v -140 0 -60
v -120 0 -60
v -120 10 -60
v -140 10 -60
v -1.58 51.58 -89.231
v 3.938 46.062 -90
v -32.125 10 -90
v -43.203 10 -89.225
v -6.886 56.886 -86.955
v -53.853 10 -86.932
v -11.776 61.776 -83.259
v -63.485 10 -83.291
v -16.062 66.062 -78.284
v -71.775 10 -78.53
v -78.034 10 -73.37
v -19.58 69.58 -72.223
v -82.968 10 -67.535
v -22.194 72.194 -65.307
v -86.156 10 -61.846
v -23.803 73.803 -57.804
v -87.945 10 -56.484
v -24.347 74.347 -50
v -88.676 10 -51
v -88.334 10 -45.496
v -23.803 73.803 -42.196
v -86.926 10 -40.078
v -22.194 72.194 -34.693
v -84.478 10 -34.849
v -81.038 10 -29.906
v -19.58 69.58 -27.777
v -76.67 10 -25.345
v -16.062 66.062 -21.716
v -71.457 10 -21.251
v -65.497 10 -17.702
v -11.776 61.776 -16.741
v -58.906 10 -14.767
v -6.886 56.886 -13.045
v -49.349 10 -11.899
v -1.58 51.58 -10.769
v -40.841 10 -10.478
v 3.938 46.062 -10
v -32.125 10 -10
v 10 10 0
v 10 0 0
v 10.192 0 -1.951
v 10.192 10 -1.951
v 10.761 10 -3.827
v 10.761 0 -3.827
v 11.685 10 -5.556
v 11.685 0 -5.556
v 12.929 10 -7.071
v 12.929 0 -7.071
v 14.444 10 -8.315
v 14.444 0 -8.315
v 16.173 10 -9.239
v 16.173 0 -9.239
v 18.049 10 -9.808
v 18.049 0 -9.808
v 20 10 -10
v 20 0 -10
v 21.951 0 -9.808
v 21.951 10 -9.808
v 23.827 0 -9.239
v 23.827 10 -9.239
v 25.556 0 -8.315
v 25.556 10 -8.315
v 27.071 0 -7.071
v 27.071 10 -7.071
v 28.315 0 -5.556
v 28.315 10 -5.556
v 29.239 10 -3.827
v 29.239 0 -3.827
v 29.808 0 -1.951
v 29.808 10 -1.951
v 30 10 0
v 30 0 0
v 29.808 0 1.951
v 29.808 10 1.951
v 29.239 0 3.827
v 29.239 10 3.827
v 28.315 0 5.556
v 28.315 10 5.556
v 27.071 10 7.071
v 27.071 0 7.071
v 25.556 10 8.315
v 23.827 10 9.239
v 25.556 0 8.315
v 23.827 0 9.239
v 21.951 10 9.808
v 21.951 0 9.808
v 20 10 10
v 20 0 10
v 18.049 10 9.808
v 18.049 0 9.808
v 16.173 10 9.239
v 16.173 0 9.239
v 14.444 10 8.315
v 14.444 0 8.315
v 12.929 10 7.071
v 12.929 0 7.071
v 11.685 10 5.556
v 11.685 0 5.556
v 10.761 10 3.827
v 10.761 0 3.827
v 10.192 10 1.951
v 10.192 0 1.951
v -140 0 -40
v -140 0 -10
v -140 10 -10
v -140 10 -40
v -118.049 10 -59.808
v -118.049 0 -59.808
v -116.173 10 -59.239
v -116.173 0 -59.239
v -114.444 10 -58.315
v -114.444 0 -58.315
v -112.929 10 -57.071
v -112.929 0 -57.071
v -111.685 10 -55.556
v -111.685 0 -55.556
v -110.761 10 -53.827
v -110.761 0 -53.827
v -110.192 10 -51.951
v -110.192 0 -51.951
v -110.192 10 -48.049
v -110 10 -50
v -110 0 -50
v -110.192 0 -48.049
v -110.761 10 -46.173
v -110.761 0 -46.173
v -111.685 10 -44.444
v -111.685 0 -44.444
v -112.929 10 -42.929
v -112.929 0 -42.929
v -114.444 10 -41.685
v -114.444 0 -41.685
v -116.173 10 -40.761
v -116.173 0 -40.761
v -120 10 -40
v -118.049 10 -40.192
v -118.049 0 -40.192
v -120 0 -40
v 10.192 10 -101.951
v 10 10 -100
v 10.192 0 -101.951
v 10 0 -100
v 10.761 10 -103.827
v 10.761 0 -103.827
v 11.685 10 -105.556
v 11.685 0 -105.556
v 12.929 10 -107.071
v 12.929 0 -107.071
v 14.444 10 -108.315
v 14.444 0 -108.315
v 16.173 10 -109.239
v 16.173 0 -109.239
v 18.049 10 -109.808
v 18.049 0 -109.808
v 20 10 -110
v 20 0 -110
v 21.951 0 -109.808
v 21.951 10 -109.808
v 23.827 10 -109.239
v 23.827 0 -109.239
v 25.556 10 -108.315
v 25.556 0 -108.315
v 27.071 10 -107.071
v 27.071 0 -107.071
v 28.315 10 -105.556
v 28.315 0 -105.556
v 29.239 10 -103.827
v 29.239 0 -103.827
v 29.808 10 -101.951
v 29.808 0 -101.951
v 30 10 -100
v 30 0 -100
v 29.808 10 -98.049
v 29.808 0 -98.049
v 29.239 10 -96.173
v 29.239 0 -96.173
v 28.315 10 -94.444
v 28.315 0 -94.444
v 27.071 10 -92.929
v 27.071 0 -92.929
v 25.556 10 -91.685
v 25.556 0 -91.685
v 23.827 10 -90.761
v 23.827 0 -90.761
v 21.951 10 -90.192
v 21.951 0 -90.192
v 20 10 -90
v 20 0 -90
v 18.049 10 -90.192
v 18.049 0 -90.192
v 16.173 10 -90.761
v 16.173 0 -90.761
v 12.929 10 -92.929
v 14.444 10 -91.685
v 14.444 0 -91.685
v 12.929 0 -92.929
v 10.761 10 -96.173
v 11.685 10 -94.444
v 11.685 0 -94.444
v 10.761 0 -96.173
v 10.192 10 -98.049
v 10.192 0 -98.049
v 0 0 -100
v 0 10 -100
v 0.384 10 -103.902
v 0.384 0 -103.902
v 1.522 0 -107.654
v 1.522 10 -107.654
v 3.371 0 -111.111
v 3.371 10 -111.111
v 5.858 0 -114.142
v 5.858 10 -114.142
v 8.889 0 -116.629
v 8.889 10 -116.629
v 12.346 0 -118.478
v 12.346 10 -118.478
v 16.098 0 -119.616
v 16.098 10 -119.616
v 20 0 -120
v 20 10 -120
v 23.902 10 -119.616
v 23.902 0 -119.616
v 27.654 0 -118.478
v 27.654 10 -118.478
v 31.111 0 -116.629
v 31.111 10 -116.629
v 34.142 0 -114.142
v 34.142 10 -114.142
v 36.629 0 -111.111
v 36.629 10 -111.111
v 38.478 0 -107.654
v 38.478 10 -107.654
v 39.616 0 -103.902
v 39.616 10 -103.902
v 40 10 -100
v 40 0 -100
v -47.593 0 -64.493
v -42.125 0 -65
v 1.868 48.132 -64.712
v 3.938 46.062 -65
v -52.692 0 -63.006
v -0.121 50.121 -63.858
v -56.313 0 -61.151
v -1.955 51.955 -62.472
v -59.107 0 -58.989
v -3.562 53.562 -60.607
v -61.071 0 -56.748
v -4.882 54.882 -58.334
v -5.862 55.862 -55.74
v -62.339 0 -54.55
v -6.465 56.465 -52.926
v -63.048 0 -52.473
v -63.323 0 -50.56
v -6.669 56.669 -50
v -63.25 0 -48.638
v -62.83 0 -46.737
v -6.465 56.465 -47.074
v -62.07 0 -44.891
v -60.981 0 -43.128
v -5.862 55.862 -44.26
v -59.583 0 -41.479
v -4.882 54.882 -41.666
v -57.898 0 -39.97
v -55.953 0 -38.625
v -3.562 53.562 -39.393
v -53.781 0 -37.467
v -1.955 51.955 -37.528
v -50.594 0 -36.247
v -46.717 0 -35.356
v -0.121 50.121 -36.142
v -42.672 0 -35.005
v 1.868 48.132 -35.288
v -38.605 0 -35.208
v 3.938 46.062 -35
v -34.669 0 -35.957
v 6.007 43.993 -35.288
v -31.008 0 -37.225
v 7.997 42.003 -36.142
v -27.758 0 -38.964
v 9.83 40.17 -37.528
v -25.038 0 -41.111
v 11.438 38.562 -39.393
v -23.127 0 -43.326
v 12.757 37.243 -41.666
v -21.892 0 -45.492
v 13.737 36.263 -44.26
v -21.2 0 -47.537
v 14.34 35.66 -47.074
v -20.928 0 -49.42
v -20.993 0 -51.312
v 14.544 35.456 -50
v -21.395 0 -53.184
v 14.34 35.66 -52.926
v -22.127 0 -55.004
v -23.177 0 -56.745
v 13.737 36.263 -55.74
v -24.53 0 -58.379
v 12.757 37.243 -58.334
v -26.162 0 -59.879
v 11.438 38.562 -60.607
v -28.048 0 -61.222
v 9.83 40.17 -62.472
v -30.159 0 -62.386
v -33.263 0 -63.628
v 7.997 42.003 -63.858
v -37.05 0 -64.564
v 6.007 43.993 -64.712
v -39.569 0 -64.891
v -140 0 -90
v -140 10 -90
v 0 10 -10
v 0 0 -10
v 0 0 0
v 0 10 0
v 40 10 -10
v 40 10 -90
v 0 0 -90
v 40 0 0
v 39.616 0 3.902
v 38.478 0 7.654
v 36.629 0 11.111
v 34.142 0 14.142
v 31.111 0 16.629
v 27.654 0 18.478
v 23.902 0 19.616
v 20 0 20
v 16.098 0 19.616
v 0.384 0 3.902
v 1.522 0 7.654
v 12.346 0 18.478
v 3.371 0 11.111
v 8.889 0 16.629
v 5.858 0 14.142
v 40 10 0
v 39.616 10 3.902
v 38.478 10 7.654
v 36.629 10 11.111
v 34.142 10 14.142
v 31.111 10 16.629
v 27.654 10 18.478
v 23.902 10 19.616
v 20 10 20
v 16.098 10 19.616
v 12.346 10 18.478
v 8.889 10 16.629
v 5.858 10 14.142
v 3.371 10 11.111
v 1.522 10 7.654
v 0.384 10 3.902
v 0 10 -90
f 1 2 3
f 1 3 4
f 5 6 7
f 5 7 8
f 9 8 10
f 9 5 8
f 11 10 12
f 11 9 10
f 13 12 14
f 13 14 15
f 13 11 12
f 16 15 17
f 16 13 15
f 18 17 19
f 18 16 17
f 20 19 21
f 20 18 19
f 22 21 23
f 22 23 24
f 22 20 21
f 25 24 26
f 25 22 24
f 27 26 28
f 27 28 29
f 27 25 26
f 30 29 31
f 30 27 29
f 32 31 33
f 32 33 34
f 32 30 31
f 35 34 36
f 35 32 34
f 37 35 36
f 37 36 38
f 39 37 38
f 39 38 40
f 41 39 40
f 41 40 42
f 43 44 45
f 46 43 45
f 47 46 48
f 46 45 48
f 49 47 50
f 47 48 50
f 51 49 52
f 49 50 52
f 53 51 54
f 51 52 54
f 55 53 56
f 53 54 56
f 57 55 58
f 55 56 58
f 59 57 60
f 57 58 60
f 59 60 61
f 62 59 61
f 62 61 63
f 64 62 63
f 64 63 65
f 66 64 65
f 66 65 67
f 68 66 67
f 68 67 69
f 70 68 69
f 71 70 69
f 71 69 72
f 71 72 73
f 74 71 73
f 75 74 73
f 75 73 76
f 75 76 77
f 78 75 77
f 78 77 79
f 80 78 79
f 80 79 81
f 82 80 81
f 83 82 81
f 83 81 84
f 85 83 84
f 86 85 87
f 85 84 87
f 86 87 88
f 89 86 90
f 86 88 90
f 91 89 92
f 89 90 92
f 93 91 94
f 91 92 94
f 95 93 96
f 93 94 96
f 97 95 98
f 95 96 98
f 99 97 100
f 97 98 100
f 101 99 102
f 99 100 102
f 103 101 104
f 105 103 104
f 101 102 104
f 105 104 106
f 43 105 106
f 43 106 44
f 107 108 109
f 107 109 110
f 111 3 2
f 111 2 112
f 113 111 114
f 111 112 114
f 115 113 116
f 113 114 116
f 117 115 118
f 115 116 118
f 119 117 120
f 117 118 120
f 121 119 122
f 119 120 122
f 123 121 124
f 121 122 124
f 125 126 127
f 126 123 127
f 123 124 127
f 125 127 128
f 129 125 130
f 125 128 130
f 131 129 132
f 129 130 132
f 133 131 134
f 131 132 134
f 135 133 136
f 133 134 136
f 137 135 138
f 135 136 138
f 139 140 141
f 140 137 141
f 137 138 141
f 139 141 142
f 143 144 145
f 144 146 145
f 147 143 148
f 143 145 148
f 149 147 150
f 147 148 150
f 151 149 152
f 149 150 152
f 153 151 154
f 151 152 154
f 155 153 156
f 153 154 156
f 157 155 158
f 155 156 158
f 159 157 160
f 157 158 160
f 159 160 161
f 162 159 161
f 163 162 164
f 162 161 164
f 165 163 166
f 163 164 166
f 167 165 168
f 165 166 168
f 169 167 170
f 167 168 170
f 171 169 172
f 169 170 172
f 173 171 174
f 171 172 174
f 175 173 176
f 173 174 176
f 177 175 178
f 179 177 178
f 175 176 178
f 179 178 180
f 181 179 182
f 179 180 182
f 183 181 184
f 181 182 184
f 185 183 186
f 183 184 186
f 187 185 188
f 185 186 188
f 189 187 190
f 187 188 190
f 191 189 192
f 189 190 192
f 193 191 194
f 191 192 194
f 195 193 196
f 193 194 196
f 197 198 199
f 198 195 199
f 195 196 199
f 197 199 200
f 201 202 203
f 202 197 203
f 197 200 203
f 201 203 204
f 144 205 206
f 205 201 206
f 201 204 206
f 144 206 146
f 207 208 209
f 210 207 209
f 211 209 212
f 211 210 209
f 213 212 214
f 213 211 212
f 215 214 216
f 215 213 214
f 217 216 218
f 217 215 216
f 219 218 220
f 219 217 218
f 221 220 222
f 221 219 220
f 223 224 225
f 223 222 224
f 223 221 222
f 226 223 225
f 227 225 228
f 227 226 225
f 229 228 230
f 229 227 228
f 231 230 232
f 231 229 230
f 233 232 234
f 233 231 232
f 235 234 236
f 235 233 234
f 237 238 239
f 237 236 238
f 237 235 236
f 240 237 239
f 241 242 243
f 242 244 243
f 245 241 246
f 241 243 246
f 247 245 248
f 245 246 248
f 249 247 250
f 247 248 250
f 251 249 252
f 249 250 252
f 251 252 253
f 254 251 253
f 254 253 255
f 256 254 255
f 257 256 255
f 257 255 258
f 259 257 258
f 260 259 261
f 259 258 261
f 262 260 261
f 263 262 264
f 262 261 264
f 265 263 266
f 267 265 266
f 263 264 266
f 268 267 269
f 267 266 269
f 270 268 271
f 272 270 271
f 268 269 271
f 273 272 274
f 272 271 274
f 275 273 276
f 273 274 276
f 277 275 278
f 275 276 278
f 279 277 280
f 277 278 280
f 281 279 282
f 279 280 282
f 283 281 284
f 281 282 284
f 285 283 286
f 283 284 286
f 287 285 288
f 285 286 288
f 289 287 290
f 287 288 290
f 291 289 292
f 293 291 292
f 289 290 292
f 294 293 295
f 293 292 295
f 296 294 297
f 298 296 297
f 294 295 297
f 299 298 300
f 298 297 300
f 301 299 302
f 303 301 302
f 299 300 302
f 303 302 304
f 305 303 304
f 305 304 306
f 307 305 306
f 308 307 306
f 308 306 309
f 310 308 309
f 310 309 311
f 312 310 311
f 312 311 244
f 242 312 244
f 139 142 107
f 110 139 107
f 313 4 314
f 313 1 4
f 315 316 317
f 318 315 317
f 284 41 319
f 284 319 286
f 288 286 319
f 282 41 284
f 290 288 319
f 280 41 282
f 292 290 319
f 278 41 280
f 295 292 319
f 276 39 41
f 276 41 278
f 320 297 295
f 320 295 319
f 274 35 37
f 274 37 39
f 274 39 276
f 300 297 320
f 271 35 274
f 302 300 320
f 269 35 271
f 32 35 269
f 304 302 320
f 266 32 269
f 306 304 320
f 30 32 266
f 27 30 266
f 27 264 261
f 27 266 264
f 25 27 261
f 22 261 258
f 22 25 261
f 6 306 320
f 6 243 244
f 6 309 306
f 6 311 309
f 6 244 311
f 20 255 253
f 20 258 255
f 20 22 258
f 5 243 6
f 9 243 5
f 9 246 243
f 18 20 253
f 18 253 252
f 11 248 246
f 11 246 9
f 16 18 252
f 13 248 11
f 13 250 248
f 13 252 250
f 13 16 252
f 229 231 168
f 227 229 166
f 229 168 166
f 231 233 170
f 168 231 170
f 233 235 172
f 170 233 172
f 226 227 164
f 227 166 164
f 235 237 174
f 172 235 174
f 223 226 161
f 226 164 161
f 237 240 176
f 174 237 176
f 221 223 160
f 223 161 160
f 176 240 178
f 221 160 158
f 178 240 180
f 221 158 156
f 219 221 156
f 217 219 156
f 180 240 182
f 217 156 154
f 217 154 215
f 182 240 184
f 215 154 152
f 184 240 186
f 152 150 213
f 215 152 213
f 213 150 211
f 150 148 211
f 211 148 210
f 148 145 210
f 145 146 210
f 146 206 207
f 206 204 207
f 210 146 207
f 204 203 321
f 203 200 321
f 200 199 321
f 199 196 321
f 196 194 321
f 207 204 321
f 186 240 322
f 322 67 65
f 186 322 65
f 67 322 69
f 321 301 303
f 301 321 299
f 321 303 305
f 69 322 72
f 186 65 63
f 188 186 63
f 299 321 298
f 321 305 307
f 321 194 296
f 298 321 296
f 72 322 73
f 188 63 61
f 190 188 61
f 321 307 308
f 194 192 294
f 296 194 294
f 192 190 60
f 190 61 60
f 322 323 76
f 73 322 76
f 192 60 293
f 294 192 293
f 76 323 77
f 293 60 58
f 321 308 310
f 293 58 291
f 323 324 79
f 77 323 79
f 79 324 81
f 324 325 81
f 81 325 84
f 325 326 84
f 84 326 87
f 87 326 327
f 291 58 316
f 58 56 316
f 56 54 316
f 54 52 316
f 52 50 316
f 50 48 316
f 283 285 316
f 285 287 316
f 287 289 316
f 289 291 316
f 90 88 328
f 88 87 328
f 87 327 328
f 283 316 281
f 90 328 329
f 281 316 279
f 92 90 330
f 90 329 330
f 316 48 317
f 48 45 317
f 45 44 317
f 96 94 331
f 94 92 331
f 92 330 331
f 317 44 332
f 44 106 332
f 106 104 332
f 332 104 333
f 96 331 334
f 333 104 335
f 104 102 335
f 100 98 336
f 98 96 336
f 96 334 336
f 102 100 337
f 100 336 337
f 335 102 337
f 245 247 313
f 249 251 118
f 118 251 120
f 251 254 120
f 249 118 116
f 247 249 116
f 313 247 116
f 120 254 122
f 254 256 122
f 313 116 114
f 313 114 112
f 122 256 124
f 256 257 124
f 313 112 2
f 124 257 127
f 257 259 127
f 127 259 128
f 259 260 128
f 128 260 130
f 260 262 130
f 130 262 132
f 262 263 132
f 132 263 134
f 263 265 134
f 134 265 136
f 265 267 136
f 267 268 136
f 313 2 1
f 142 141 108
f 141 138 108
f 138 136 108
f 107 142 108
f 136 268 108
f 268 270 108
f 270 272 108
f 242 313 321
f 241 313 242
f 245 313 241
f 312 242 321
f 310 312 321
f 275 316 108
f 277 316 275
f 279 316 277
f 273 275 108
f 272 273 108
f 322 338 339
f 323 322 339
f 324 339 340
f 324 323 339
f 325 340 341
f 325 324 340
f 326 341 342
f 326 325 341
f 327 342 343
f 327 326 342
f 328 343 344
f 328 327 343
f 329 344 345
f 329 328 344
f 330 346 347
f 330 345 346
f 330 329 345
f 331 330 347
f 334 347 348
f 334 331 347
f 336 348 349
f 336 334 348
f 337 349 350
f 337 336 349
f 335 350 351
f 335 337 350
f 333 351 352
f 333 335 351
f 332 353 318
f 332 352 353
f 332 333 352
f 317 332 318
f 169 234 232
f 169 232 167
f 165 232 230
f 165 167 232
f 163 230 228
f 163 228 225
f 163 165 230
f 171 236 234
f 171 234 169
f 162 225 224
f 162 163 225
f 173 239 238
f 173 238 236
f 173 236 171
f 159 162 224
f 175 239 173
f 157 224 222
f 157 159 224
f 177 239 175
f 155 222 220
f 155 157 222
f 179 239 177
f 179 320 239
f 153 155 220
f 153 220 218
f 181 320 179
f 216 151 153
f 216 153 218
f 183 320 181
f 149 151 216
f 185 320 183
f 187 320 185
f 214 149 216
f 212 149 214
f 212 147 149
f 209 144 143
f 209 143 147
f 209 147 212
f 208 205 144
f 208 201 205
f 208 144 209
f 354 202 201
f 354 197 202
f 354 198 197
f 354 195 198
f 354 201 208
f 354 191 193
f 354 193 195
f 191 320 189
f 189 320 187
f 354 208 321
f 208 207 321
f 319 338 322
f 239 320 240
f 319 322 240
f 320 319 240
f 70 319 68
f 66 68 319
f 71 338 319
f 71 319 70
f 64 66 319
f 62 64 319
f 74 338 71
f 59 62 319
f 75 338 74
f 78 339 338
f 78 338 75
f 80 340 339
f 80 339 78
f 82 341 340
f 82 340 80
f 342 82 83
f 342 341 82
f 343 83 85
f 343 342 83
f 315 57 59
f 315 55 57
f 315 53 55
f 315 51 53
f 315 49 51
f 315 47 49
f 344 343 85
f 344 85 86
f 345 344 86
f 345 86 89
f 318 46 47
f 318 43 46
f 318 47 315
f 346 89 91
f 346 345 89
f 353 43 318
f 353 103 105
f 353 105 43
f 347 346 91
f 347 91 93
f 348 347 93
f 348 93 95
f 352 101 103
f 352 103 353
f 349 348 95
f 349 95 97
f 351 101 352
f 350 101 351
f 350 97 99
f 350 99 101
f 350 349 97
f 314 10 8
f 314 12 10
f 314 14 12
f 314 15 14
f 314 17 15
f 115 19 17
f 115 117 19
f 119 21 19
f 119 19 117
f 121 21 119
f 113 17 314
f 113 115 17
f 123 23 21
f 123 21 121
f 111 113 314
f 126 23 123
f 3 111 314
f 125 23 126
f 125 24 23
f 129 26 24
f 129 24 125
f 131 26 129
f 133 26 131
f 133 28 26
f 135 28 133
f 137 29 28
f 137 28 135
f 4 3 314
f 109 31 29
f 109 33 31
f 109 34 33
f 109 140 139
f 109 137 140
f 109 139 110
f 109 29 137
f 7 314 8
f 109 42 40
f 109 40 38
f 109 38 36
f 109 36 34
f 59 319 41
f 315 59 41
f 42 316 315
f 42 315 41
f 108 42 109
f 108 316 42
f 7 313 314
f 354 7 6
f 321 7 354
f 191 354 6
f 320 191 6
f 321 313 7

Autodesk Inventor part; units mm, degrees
ref_plane "YZ Plane" through (0, 0, 0) normal (1, 0, 0) x (0, 1, 0)
ref_plane "XZ Plane" through (0, 0, 0) normal (0, 1, 0) x (-1, 0, 0)
sketch "Sketch1" plane through (0, 0, 0) normal (0, 1, 0) x (-1, 0, 0)
  line L0 (-40, 0) -> (-40, -100)
  line L1 (-30, -100) -> (-10, -100)
  line L2 (0, -10) -> (140, -10)
  line L3 (140, -90) -> (0, -90)
  arc A0 (0, 0) -> (-40, 0) centre (-20, 0) ccw
  arc A1 (-40, -100) -> (0, -100) centre (-20, -100) ccw
  circle A2 centre (-20, 0) radius 10
  circle A3 centre (-20, -100) radius 10
  arc A4 (120, -40) -> (120, -60) centre (120, -50) ccw
  line L4 (120, -40) -> (140, -40)
  line L5 (120, -60) -> (140, -60)
  line L6 (140, -10) -> (140, -40)
  line L7 (140, -60) -> (140, -90)
  line L8 (0, -100) -> (0, -90)
  line L9 (0, -10) -> (0, 0)
  line L10 (-30, 0) -> (-40, 0)
  dimension "d4" = 20
  dimension "d0" = 40
  dimension "d1" = 100
  dimension "d2" = 140
  dimension "d3" = 80
  dimension "d5" = 20
  dimension "d6" = 20
  dimension "d8" = 20
  dimension "d9" = 20
extrude "Extrusion1" add sketch "Sketch1" along normal blind 10
ref_plane "Work Plane1" through (40, 10, 0) normal (0.7071, 0.7071, 0) x (0, 0, -1)
sketch "Sketch2" plane through (0, 10, 0) normal (0, 1, 0) x (1, 0, 0)
  point P0 (0, 0)
sketch "Sketch3" plane through (40, 10, 0) normal (0.7071, 0.7071, 0) x (0, 0, -1)
  line L0 (90, 51) -> (90, 0)
  line L1 (90, 0) -> (10, 0)
  line L2 (10, 0) -> (10, 51)
  arc A0 (90, 51) -> (10, 51) centre (50, 51) ccw
  circle A1 centre (50, 51) radius 15
  point P0 (0, 21.2132)
  point P1 (90, 28.2843)
  dimension "d13" = 51
  dimension "d14" = 30
extrude "Extrusion2" add sketch "Sketch3" against normal up to next
sketch "Sketch4" plane through (40, 10, 0) normal (0.7071, 0.7071, 0) x (0, 0, -1)
  circle A0 centre (50, 51) radius 15 projected
  circle A1 centre (50, 51) radius 15
  point P0 (0, 21.2132)
  dimension "d17" = 30
extrude "Extrusion3" cut sketch "Sketch4" against normal up to surface surface through (-48.5464, 0, -50) normal (0, 1, 0)
properties part number "BT2" material "Nylon 6/6"
